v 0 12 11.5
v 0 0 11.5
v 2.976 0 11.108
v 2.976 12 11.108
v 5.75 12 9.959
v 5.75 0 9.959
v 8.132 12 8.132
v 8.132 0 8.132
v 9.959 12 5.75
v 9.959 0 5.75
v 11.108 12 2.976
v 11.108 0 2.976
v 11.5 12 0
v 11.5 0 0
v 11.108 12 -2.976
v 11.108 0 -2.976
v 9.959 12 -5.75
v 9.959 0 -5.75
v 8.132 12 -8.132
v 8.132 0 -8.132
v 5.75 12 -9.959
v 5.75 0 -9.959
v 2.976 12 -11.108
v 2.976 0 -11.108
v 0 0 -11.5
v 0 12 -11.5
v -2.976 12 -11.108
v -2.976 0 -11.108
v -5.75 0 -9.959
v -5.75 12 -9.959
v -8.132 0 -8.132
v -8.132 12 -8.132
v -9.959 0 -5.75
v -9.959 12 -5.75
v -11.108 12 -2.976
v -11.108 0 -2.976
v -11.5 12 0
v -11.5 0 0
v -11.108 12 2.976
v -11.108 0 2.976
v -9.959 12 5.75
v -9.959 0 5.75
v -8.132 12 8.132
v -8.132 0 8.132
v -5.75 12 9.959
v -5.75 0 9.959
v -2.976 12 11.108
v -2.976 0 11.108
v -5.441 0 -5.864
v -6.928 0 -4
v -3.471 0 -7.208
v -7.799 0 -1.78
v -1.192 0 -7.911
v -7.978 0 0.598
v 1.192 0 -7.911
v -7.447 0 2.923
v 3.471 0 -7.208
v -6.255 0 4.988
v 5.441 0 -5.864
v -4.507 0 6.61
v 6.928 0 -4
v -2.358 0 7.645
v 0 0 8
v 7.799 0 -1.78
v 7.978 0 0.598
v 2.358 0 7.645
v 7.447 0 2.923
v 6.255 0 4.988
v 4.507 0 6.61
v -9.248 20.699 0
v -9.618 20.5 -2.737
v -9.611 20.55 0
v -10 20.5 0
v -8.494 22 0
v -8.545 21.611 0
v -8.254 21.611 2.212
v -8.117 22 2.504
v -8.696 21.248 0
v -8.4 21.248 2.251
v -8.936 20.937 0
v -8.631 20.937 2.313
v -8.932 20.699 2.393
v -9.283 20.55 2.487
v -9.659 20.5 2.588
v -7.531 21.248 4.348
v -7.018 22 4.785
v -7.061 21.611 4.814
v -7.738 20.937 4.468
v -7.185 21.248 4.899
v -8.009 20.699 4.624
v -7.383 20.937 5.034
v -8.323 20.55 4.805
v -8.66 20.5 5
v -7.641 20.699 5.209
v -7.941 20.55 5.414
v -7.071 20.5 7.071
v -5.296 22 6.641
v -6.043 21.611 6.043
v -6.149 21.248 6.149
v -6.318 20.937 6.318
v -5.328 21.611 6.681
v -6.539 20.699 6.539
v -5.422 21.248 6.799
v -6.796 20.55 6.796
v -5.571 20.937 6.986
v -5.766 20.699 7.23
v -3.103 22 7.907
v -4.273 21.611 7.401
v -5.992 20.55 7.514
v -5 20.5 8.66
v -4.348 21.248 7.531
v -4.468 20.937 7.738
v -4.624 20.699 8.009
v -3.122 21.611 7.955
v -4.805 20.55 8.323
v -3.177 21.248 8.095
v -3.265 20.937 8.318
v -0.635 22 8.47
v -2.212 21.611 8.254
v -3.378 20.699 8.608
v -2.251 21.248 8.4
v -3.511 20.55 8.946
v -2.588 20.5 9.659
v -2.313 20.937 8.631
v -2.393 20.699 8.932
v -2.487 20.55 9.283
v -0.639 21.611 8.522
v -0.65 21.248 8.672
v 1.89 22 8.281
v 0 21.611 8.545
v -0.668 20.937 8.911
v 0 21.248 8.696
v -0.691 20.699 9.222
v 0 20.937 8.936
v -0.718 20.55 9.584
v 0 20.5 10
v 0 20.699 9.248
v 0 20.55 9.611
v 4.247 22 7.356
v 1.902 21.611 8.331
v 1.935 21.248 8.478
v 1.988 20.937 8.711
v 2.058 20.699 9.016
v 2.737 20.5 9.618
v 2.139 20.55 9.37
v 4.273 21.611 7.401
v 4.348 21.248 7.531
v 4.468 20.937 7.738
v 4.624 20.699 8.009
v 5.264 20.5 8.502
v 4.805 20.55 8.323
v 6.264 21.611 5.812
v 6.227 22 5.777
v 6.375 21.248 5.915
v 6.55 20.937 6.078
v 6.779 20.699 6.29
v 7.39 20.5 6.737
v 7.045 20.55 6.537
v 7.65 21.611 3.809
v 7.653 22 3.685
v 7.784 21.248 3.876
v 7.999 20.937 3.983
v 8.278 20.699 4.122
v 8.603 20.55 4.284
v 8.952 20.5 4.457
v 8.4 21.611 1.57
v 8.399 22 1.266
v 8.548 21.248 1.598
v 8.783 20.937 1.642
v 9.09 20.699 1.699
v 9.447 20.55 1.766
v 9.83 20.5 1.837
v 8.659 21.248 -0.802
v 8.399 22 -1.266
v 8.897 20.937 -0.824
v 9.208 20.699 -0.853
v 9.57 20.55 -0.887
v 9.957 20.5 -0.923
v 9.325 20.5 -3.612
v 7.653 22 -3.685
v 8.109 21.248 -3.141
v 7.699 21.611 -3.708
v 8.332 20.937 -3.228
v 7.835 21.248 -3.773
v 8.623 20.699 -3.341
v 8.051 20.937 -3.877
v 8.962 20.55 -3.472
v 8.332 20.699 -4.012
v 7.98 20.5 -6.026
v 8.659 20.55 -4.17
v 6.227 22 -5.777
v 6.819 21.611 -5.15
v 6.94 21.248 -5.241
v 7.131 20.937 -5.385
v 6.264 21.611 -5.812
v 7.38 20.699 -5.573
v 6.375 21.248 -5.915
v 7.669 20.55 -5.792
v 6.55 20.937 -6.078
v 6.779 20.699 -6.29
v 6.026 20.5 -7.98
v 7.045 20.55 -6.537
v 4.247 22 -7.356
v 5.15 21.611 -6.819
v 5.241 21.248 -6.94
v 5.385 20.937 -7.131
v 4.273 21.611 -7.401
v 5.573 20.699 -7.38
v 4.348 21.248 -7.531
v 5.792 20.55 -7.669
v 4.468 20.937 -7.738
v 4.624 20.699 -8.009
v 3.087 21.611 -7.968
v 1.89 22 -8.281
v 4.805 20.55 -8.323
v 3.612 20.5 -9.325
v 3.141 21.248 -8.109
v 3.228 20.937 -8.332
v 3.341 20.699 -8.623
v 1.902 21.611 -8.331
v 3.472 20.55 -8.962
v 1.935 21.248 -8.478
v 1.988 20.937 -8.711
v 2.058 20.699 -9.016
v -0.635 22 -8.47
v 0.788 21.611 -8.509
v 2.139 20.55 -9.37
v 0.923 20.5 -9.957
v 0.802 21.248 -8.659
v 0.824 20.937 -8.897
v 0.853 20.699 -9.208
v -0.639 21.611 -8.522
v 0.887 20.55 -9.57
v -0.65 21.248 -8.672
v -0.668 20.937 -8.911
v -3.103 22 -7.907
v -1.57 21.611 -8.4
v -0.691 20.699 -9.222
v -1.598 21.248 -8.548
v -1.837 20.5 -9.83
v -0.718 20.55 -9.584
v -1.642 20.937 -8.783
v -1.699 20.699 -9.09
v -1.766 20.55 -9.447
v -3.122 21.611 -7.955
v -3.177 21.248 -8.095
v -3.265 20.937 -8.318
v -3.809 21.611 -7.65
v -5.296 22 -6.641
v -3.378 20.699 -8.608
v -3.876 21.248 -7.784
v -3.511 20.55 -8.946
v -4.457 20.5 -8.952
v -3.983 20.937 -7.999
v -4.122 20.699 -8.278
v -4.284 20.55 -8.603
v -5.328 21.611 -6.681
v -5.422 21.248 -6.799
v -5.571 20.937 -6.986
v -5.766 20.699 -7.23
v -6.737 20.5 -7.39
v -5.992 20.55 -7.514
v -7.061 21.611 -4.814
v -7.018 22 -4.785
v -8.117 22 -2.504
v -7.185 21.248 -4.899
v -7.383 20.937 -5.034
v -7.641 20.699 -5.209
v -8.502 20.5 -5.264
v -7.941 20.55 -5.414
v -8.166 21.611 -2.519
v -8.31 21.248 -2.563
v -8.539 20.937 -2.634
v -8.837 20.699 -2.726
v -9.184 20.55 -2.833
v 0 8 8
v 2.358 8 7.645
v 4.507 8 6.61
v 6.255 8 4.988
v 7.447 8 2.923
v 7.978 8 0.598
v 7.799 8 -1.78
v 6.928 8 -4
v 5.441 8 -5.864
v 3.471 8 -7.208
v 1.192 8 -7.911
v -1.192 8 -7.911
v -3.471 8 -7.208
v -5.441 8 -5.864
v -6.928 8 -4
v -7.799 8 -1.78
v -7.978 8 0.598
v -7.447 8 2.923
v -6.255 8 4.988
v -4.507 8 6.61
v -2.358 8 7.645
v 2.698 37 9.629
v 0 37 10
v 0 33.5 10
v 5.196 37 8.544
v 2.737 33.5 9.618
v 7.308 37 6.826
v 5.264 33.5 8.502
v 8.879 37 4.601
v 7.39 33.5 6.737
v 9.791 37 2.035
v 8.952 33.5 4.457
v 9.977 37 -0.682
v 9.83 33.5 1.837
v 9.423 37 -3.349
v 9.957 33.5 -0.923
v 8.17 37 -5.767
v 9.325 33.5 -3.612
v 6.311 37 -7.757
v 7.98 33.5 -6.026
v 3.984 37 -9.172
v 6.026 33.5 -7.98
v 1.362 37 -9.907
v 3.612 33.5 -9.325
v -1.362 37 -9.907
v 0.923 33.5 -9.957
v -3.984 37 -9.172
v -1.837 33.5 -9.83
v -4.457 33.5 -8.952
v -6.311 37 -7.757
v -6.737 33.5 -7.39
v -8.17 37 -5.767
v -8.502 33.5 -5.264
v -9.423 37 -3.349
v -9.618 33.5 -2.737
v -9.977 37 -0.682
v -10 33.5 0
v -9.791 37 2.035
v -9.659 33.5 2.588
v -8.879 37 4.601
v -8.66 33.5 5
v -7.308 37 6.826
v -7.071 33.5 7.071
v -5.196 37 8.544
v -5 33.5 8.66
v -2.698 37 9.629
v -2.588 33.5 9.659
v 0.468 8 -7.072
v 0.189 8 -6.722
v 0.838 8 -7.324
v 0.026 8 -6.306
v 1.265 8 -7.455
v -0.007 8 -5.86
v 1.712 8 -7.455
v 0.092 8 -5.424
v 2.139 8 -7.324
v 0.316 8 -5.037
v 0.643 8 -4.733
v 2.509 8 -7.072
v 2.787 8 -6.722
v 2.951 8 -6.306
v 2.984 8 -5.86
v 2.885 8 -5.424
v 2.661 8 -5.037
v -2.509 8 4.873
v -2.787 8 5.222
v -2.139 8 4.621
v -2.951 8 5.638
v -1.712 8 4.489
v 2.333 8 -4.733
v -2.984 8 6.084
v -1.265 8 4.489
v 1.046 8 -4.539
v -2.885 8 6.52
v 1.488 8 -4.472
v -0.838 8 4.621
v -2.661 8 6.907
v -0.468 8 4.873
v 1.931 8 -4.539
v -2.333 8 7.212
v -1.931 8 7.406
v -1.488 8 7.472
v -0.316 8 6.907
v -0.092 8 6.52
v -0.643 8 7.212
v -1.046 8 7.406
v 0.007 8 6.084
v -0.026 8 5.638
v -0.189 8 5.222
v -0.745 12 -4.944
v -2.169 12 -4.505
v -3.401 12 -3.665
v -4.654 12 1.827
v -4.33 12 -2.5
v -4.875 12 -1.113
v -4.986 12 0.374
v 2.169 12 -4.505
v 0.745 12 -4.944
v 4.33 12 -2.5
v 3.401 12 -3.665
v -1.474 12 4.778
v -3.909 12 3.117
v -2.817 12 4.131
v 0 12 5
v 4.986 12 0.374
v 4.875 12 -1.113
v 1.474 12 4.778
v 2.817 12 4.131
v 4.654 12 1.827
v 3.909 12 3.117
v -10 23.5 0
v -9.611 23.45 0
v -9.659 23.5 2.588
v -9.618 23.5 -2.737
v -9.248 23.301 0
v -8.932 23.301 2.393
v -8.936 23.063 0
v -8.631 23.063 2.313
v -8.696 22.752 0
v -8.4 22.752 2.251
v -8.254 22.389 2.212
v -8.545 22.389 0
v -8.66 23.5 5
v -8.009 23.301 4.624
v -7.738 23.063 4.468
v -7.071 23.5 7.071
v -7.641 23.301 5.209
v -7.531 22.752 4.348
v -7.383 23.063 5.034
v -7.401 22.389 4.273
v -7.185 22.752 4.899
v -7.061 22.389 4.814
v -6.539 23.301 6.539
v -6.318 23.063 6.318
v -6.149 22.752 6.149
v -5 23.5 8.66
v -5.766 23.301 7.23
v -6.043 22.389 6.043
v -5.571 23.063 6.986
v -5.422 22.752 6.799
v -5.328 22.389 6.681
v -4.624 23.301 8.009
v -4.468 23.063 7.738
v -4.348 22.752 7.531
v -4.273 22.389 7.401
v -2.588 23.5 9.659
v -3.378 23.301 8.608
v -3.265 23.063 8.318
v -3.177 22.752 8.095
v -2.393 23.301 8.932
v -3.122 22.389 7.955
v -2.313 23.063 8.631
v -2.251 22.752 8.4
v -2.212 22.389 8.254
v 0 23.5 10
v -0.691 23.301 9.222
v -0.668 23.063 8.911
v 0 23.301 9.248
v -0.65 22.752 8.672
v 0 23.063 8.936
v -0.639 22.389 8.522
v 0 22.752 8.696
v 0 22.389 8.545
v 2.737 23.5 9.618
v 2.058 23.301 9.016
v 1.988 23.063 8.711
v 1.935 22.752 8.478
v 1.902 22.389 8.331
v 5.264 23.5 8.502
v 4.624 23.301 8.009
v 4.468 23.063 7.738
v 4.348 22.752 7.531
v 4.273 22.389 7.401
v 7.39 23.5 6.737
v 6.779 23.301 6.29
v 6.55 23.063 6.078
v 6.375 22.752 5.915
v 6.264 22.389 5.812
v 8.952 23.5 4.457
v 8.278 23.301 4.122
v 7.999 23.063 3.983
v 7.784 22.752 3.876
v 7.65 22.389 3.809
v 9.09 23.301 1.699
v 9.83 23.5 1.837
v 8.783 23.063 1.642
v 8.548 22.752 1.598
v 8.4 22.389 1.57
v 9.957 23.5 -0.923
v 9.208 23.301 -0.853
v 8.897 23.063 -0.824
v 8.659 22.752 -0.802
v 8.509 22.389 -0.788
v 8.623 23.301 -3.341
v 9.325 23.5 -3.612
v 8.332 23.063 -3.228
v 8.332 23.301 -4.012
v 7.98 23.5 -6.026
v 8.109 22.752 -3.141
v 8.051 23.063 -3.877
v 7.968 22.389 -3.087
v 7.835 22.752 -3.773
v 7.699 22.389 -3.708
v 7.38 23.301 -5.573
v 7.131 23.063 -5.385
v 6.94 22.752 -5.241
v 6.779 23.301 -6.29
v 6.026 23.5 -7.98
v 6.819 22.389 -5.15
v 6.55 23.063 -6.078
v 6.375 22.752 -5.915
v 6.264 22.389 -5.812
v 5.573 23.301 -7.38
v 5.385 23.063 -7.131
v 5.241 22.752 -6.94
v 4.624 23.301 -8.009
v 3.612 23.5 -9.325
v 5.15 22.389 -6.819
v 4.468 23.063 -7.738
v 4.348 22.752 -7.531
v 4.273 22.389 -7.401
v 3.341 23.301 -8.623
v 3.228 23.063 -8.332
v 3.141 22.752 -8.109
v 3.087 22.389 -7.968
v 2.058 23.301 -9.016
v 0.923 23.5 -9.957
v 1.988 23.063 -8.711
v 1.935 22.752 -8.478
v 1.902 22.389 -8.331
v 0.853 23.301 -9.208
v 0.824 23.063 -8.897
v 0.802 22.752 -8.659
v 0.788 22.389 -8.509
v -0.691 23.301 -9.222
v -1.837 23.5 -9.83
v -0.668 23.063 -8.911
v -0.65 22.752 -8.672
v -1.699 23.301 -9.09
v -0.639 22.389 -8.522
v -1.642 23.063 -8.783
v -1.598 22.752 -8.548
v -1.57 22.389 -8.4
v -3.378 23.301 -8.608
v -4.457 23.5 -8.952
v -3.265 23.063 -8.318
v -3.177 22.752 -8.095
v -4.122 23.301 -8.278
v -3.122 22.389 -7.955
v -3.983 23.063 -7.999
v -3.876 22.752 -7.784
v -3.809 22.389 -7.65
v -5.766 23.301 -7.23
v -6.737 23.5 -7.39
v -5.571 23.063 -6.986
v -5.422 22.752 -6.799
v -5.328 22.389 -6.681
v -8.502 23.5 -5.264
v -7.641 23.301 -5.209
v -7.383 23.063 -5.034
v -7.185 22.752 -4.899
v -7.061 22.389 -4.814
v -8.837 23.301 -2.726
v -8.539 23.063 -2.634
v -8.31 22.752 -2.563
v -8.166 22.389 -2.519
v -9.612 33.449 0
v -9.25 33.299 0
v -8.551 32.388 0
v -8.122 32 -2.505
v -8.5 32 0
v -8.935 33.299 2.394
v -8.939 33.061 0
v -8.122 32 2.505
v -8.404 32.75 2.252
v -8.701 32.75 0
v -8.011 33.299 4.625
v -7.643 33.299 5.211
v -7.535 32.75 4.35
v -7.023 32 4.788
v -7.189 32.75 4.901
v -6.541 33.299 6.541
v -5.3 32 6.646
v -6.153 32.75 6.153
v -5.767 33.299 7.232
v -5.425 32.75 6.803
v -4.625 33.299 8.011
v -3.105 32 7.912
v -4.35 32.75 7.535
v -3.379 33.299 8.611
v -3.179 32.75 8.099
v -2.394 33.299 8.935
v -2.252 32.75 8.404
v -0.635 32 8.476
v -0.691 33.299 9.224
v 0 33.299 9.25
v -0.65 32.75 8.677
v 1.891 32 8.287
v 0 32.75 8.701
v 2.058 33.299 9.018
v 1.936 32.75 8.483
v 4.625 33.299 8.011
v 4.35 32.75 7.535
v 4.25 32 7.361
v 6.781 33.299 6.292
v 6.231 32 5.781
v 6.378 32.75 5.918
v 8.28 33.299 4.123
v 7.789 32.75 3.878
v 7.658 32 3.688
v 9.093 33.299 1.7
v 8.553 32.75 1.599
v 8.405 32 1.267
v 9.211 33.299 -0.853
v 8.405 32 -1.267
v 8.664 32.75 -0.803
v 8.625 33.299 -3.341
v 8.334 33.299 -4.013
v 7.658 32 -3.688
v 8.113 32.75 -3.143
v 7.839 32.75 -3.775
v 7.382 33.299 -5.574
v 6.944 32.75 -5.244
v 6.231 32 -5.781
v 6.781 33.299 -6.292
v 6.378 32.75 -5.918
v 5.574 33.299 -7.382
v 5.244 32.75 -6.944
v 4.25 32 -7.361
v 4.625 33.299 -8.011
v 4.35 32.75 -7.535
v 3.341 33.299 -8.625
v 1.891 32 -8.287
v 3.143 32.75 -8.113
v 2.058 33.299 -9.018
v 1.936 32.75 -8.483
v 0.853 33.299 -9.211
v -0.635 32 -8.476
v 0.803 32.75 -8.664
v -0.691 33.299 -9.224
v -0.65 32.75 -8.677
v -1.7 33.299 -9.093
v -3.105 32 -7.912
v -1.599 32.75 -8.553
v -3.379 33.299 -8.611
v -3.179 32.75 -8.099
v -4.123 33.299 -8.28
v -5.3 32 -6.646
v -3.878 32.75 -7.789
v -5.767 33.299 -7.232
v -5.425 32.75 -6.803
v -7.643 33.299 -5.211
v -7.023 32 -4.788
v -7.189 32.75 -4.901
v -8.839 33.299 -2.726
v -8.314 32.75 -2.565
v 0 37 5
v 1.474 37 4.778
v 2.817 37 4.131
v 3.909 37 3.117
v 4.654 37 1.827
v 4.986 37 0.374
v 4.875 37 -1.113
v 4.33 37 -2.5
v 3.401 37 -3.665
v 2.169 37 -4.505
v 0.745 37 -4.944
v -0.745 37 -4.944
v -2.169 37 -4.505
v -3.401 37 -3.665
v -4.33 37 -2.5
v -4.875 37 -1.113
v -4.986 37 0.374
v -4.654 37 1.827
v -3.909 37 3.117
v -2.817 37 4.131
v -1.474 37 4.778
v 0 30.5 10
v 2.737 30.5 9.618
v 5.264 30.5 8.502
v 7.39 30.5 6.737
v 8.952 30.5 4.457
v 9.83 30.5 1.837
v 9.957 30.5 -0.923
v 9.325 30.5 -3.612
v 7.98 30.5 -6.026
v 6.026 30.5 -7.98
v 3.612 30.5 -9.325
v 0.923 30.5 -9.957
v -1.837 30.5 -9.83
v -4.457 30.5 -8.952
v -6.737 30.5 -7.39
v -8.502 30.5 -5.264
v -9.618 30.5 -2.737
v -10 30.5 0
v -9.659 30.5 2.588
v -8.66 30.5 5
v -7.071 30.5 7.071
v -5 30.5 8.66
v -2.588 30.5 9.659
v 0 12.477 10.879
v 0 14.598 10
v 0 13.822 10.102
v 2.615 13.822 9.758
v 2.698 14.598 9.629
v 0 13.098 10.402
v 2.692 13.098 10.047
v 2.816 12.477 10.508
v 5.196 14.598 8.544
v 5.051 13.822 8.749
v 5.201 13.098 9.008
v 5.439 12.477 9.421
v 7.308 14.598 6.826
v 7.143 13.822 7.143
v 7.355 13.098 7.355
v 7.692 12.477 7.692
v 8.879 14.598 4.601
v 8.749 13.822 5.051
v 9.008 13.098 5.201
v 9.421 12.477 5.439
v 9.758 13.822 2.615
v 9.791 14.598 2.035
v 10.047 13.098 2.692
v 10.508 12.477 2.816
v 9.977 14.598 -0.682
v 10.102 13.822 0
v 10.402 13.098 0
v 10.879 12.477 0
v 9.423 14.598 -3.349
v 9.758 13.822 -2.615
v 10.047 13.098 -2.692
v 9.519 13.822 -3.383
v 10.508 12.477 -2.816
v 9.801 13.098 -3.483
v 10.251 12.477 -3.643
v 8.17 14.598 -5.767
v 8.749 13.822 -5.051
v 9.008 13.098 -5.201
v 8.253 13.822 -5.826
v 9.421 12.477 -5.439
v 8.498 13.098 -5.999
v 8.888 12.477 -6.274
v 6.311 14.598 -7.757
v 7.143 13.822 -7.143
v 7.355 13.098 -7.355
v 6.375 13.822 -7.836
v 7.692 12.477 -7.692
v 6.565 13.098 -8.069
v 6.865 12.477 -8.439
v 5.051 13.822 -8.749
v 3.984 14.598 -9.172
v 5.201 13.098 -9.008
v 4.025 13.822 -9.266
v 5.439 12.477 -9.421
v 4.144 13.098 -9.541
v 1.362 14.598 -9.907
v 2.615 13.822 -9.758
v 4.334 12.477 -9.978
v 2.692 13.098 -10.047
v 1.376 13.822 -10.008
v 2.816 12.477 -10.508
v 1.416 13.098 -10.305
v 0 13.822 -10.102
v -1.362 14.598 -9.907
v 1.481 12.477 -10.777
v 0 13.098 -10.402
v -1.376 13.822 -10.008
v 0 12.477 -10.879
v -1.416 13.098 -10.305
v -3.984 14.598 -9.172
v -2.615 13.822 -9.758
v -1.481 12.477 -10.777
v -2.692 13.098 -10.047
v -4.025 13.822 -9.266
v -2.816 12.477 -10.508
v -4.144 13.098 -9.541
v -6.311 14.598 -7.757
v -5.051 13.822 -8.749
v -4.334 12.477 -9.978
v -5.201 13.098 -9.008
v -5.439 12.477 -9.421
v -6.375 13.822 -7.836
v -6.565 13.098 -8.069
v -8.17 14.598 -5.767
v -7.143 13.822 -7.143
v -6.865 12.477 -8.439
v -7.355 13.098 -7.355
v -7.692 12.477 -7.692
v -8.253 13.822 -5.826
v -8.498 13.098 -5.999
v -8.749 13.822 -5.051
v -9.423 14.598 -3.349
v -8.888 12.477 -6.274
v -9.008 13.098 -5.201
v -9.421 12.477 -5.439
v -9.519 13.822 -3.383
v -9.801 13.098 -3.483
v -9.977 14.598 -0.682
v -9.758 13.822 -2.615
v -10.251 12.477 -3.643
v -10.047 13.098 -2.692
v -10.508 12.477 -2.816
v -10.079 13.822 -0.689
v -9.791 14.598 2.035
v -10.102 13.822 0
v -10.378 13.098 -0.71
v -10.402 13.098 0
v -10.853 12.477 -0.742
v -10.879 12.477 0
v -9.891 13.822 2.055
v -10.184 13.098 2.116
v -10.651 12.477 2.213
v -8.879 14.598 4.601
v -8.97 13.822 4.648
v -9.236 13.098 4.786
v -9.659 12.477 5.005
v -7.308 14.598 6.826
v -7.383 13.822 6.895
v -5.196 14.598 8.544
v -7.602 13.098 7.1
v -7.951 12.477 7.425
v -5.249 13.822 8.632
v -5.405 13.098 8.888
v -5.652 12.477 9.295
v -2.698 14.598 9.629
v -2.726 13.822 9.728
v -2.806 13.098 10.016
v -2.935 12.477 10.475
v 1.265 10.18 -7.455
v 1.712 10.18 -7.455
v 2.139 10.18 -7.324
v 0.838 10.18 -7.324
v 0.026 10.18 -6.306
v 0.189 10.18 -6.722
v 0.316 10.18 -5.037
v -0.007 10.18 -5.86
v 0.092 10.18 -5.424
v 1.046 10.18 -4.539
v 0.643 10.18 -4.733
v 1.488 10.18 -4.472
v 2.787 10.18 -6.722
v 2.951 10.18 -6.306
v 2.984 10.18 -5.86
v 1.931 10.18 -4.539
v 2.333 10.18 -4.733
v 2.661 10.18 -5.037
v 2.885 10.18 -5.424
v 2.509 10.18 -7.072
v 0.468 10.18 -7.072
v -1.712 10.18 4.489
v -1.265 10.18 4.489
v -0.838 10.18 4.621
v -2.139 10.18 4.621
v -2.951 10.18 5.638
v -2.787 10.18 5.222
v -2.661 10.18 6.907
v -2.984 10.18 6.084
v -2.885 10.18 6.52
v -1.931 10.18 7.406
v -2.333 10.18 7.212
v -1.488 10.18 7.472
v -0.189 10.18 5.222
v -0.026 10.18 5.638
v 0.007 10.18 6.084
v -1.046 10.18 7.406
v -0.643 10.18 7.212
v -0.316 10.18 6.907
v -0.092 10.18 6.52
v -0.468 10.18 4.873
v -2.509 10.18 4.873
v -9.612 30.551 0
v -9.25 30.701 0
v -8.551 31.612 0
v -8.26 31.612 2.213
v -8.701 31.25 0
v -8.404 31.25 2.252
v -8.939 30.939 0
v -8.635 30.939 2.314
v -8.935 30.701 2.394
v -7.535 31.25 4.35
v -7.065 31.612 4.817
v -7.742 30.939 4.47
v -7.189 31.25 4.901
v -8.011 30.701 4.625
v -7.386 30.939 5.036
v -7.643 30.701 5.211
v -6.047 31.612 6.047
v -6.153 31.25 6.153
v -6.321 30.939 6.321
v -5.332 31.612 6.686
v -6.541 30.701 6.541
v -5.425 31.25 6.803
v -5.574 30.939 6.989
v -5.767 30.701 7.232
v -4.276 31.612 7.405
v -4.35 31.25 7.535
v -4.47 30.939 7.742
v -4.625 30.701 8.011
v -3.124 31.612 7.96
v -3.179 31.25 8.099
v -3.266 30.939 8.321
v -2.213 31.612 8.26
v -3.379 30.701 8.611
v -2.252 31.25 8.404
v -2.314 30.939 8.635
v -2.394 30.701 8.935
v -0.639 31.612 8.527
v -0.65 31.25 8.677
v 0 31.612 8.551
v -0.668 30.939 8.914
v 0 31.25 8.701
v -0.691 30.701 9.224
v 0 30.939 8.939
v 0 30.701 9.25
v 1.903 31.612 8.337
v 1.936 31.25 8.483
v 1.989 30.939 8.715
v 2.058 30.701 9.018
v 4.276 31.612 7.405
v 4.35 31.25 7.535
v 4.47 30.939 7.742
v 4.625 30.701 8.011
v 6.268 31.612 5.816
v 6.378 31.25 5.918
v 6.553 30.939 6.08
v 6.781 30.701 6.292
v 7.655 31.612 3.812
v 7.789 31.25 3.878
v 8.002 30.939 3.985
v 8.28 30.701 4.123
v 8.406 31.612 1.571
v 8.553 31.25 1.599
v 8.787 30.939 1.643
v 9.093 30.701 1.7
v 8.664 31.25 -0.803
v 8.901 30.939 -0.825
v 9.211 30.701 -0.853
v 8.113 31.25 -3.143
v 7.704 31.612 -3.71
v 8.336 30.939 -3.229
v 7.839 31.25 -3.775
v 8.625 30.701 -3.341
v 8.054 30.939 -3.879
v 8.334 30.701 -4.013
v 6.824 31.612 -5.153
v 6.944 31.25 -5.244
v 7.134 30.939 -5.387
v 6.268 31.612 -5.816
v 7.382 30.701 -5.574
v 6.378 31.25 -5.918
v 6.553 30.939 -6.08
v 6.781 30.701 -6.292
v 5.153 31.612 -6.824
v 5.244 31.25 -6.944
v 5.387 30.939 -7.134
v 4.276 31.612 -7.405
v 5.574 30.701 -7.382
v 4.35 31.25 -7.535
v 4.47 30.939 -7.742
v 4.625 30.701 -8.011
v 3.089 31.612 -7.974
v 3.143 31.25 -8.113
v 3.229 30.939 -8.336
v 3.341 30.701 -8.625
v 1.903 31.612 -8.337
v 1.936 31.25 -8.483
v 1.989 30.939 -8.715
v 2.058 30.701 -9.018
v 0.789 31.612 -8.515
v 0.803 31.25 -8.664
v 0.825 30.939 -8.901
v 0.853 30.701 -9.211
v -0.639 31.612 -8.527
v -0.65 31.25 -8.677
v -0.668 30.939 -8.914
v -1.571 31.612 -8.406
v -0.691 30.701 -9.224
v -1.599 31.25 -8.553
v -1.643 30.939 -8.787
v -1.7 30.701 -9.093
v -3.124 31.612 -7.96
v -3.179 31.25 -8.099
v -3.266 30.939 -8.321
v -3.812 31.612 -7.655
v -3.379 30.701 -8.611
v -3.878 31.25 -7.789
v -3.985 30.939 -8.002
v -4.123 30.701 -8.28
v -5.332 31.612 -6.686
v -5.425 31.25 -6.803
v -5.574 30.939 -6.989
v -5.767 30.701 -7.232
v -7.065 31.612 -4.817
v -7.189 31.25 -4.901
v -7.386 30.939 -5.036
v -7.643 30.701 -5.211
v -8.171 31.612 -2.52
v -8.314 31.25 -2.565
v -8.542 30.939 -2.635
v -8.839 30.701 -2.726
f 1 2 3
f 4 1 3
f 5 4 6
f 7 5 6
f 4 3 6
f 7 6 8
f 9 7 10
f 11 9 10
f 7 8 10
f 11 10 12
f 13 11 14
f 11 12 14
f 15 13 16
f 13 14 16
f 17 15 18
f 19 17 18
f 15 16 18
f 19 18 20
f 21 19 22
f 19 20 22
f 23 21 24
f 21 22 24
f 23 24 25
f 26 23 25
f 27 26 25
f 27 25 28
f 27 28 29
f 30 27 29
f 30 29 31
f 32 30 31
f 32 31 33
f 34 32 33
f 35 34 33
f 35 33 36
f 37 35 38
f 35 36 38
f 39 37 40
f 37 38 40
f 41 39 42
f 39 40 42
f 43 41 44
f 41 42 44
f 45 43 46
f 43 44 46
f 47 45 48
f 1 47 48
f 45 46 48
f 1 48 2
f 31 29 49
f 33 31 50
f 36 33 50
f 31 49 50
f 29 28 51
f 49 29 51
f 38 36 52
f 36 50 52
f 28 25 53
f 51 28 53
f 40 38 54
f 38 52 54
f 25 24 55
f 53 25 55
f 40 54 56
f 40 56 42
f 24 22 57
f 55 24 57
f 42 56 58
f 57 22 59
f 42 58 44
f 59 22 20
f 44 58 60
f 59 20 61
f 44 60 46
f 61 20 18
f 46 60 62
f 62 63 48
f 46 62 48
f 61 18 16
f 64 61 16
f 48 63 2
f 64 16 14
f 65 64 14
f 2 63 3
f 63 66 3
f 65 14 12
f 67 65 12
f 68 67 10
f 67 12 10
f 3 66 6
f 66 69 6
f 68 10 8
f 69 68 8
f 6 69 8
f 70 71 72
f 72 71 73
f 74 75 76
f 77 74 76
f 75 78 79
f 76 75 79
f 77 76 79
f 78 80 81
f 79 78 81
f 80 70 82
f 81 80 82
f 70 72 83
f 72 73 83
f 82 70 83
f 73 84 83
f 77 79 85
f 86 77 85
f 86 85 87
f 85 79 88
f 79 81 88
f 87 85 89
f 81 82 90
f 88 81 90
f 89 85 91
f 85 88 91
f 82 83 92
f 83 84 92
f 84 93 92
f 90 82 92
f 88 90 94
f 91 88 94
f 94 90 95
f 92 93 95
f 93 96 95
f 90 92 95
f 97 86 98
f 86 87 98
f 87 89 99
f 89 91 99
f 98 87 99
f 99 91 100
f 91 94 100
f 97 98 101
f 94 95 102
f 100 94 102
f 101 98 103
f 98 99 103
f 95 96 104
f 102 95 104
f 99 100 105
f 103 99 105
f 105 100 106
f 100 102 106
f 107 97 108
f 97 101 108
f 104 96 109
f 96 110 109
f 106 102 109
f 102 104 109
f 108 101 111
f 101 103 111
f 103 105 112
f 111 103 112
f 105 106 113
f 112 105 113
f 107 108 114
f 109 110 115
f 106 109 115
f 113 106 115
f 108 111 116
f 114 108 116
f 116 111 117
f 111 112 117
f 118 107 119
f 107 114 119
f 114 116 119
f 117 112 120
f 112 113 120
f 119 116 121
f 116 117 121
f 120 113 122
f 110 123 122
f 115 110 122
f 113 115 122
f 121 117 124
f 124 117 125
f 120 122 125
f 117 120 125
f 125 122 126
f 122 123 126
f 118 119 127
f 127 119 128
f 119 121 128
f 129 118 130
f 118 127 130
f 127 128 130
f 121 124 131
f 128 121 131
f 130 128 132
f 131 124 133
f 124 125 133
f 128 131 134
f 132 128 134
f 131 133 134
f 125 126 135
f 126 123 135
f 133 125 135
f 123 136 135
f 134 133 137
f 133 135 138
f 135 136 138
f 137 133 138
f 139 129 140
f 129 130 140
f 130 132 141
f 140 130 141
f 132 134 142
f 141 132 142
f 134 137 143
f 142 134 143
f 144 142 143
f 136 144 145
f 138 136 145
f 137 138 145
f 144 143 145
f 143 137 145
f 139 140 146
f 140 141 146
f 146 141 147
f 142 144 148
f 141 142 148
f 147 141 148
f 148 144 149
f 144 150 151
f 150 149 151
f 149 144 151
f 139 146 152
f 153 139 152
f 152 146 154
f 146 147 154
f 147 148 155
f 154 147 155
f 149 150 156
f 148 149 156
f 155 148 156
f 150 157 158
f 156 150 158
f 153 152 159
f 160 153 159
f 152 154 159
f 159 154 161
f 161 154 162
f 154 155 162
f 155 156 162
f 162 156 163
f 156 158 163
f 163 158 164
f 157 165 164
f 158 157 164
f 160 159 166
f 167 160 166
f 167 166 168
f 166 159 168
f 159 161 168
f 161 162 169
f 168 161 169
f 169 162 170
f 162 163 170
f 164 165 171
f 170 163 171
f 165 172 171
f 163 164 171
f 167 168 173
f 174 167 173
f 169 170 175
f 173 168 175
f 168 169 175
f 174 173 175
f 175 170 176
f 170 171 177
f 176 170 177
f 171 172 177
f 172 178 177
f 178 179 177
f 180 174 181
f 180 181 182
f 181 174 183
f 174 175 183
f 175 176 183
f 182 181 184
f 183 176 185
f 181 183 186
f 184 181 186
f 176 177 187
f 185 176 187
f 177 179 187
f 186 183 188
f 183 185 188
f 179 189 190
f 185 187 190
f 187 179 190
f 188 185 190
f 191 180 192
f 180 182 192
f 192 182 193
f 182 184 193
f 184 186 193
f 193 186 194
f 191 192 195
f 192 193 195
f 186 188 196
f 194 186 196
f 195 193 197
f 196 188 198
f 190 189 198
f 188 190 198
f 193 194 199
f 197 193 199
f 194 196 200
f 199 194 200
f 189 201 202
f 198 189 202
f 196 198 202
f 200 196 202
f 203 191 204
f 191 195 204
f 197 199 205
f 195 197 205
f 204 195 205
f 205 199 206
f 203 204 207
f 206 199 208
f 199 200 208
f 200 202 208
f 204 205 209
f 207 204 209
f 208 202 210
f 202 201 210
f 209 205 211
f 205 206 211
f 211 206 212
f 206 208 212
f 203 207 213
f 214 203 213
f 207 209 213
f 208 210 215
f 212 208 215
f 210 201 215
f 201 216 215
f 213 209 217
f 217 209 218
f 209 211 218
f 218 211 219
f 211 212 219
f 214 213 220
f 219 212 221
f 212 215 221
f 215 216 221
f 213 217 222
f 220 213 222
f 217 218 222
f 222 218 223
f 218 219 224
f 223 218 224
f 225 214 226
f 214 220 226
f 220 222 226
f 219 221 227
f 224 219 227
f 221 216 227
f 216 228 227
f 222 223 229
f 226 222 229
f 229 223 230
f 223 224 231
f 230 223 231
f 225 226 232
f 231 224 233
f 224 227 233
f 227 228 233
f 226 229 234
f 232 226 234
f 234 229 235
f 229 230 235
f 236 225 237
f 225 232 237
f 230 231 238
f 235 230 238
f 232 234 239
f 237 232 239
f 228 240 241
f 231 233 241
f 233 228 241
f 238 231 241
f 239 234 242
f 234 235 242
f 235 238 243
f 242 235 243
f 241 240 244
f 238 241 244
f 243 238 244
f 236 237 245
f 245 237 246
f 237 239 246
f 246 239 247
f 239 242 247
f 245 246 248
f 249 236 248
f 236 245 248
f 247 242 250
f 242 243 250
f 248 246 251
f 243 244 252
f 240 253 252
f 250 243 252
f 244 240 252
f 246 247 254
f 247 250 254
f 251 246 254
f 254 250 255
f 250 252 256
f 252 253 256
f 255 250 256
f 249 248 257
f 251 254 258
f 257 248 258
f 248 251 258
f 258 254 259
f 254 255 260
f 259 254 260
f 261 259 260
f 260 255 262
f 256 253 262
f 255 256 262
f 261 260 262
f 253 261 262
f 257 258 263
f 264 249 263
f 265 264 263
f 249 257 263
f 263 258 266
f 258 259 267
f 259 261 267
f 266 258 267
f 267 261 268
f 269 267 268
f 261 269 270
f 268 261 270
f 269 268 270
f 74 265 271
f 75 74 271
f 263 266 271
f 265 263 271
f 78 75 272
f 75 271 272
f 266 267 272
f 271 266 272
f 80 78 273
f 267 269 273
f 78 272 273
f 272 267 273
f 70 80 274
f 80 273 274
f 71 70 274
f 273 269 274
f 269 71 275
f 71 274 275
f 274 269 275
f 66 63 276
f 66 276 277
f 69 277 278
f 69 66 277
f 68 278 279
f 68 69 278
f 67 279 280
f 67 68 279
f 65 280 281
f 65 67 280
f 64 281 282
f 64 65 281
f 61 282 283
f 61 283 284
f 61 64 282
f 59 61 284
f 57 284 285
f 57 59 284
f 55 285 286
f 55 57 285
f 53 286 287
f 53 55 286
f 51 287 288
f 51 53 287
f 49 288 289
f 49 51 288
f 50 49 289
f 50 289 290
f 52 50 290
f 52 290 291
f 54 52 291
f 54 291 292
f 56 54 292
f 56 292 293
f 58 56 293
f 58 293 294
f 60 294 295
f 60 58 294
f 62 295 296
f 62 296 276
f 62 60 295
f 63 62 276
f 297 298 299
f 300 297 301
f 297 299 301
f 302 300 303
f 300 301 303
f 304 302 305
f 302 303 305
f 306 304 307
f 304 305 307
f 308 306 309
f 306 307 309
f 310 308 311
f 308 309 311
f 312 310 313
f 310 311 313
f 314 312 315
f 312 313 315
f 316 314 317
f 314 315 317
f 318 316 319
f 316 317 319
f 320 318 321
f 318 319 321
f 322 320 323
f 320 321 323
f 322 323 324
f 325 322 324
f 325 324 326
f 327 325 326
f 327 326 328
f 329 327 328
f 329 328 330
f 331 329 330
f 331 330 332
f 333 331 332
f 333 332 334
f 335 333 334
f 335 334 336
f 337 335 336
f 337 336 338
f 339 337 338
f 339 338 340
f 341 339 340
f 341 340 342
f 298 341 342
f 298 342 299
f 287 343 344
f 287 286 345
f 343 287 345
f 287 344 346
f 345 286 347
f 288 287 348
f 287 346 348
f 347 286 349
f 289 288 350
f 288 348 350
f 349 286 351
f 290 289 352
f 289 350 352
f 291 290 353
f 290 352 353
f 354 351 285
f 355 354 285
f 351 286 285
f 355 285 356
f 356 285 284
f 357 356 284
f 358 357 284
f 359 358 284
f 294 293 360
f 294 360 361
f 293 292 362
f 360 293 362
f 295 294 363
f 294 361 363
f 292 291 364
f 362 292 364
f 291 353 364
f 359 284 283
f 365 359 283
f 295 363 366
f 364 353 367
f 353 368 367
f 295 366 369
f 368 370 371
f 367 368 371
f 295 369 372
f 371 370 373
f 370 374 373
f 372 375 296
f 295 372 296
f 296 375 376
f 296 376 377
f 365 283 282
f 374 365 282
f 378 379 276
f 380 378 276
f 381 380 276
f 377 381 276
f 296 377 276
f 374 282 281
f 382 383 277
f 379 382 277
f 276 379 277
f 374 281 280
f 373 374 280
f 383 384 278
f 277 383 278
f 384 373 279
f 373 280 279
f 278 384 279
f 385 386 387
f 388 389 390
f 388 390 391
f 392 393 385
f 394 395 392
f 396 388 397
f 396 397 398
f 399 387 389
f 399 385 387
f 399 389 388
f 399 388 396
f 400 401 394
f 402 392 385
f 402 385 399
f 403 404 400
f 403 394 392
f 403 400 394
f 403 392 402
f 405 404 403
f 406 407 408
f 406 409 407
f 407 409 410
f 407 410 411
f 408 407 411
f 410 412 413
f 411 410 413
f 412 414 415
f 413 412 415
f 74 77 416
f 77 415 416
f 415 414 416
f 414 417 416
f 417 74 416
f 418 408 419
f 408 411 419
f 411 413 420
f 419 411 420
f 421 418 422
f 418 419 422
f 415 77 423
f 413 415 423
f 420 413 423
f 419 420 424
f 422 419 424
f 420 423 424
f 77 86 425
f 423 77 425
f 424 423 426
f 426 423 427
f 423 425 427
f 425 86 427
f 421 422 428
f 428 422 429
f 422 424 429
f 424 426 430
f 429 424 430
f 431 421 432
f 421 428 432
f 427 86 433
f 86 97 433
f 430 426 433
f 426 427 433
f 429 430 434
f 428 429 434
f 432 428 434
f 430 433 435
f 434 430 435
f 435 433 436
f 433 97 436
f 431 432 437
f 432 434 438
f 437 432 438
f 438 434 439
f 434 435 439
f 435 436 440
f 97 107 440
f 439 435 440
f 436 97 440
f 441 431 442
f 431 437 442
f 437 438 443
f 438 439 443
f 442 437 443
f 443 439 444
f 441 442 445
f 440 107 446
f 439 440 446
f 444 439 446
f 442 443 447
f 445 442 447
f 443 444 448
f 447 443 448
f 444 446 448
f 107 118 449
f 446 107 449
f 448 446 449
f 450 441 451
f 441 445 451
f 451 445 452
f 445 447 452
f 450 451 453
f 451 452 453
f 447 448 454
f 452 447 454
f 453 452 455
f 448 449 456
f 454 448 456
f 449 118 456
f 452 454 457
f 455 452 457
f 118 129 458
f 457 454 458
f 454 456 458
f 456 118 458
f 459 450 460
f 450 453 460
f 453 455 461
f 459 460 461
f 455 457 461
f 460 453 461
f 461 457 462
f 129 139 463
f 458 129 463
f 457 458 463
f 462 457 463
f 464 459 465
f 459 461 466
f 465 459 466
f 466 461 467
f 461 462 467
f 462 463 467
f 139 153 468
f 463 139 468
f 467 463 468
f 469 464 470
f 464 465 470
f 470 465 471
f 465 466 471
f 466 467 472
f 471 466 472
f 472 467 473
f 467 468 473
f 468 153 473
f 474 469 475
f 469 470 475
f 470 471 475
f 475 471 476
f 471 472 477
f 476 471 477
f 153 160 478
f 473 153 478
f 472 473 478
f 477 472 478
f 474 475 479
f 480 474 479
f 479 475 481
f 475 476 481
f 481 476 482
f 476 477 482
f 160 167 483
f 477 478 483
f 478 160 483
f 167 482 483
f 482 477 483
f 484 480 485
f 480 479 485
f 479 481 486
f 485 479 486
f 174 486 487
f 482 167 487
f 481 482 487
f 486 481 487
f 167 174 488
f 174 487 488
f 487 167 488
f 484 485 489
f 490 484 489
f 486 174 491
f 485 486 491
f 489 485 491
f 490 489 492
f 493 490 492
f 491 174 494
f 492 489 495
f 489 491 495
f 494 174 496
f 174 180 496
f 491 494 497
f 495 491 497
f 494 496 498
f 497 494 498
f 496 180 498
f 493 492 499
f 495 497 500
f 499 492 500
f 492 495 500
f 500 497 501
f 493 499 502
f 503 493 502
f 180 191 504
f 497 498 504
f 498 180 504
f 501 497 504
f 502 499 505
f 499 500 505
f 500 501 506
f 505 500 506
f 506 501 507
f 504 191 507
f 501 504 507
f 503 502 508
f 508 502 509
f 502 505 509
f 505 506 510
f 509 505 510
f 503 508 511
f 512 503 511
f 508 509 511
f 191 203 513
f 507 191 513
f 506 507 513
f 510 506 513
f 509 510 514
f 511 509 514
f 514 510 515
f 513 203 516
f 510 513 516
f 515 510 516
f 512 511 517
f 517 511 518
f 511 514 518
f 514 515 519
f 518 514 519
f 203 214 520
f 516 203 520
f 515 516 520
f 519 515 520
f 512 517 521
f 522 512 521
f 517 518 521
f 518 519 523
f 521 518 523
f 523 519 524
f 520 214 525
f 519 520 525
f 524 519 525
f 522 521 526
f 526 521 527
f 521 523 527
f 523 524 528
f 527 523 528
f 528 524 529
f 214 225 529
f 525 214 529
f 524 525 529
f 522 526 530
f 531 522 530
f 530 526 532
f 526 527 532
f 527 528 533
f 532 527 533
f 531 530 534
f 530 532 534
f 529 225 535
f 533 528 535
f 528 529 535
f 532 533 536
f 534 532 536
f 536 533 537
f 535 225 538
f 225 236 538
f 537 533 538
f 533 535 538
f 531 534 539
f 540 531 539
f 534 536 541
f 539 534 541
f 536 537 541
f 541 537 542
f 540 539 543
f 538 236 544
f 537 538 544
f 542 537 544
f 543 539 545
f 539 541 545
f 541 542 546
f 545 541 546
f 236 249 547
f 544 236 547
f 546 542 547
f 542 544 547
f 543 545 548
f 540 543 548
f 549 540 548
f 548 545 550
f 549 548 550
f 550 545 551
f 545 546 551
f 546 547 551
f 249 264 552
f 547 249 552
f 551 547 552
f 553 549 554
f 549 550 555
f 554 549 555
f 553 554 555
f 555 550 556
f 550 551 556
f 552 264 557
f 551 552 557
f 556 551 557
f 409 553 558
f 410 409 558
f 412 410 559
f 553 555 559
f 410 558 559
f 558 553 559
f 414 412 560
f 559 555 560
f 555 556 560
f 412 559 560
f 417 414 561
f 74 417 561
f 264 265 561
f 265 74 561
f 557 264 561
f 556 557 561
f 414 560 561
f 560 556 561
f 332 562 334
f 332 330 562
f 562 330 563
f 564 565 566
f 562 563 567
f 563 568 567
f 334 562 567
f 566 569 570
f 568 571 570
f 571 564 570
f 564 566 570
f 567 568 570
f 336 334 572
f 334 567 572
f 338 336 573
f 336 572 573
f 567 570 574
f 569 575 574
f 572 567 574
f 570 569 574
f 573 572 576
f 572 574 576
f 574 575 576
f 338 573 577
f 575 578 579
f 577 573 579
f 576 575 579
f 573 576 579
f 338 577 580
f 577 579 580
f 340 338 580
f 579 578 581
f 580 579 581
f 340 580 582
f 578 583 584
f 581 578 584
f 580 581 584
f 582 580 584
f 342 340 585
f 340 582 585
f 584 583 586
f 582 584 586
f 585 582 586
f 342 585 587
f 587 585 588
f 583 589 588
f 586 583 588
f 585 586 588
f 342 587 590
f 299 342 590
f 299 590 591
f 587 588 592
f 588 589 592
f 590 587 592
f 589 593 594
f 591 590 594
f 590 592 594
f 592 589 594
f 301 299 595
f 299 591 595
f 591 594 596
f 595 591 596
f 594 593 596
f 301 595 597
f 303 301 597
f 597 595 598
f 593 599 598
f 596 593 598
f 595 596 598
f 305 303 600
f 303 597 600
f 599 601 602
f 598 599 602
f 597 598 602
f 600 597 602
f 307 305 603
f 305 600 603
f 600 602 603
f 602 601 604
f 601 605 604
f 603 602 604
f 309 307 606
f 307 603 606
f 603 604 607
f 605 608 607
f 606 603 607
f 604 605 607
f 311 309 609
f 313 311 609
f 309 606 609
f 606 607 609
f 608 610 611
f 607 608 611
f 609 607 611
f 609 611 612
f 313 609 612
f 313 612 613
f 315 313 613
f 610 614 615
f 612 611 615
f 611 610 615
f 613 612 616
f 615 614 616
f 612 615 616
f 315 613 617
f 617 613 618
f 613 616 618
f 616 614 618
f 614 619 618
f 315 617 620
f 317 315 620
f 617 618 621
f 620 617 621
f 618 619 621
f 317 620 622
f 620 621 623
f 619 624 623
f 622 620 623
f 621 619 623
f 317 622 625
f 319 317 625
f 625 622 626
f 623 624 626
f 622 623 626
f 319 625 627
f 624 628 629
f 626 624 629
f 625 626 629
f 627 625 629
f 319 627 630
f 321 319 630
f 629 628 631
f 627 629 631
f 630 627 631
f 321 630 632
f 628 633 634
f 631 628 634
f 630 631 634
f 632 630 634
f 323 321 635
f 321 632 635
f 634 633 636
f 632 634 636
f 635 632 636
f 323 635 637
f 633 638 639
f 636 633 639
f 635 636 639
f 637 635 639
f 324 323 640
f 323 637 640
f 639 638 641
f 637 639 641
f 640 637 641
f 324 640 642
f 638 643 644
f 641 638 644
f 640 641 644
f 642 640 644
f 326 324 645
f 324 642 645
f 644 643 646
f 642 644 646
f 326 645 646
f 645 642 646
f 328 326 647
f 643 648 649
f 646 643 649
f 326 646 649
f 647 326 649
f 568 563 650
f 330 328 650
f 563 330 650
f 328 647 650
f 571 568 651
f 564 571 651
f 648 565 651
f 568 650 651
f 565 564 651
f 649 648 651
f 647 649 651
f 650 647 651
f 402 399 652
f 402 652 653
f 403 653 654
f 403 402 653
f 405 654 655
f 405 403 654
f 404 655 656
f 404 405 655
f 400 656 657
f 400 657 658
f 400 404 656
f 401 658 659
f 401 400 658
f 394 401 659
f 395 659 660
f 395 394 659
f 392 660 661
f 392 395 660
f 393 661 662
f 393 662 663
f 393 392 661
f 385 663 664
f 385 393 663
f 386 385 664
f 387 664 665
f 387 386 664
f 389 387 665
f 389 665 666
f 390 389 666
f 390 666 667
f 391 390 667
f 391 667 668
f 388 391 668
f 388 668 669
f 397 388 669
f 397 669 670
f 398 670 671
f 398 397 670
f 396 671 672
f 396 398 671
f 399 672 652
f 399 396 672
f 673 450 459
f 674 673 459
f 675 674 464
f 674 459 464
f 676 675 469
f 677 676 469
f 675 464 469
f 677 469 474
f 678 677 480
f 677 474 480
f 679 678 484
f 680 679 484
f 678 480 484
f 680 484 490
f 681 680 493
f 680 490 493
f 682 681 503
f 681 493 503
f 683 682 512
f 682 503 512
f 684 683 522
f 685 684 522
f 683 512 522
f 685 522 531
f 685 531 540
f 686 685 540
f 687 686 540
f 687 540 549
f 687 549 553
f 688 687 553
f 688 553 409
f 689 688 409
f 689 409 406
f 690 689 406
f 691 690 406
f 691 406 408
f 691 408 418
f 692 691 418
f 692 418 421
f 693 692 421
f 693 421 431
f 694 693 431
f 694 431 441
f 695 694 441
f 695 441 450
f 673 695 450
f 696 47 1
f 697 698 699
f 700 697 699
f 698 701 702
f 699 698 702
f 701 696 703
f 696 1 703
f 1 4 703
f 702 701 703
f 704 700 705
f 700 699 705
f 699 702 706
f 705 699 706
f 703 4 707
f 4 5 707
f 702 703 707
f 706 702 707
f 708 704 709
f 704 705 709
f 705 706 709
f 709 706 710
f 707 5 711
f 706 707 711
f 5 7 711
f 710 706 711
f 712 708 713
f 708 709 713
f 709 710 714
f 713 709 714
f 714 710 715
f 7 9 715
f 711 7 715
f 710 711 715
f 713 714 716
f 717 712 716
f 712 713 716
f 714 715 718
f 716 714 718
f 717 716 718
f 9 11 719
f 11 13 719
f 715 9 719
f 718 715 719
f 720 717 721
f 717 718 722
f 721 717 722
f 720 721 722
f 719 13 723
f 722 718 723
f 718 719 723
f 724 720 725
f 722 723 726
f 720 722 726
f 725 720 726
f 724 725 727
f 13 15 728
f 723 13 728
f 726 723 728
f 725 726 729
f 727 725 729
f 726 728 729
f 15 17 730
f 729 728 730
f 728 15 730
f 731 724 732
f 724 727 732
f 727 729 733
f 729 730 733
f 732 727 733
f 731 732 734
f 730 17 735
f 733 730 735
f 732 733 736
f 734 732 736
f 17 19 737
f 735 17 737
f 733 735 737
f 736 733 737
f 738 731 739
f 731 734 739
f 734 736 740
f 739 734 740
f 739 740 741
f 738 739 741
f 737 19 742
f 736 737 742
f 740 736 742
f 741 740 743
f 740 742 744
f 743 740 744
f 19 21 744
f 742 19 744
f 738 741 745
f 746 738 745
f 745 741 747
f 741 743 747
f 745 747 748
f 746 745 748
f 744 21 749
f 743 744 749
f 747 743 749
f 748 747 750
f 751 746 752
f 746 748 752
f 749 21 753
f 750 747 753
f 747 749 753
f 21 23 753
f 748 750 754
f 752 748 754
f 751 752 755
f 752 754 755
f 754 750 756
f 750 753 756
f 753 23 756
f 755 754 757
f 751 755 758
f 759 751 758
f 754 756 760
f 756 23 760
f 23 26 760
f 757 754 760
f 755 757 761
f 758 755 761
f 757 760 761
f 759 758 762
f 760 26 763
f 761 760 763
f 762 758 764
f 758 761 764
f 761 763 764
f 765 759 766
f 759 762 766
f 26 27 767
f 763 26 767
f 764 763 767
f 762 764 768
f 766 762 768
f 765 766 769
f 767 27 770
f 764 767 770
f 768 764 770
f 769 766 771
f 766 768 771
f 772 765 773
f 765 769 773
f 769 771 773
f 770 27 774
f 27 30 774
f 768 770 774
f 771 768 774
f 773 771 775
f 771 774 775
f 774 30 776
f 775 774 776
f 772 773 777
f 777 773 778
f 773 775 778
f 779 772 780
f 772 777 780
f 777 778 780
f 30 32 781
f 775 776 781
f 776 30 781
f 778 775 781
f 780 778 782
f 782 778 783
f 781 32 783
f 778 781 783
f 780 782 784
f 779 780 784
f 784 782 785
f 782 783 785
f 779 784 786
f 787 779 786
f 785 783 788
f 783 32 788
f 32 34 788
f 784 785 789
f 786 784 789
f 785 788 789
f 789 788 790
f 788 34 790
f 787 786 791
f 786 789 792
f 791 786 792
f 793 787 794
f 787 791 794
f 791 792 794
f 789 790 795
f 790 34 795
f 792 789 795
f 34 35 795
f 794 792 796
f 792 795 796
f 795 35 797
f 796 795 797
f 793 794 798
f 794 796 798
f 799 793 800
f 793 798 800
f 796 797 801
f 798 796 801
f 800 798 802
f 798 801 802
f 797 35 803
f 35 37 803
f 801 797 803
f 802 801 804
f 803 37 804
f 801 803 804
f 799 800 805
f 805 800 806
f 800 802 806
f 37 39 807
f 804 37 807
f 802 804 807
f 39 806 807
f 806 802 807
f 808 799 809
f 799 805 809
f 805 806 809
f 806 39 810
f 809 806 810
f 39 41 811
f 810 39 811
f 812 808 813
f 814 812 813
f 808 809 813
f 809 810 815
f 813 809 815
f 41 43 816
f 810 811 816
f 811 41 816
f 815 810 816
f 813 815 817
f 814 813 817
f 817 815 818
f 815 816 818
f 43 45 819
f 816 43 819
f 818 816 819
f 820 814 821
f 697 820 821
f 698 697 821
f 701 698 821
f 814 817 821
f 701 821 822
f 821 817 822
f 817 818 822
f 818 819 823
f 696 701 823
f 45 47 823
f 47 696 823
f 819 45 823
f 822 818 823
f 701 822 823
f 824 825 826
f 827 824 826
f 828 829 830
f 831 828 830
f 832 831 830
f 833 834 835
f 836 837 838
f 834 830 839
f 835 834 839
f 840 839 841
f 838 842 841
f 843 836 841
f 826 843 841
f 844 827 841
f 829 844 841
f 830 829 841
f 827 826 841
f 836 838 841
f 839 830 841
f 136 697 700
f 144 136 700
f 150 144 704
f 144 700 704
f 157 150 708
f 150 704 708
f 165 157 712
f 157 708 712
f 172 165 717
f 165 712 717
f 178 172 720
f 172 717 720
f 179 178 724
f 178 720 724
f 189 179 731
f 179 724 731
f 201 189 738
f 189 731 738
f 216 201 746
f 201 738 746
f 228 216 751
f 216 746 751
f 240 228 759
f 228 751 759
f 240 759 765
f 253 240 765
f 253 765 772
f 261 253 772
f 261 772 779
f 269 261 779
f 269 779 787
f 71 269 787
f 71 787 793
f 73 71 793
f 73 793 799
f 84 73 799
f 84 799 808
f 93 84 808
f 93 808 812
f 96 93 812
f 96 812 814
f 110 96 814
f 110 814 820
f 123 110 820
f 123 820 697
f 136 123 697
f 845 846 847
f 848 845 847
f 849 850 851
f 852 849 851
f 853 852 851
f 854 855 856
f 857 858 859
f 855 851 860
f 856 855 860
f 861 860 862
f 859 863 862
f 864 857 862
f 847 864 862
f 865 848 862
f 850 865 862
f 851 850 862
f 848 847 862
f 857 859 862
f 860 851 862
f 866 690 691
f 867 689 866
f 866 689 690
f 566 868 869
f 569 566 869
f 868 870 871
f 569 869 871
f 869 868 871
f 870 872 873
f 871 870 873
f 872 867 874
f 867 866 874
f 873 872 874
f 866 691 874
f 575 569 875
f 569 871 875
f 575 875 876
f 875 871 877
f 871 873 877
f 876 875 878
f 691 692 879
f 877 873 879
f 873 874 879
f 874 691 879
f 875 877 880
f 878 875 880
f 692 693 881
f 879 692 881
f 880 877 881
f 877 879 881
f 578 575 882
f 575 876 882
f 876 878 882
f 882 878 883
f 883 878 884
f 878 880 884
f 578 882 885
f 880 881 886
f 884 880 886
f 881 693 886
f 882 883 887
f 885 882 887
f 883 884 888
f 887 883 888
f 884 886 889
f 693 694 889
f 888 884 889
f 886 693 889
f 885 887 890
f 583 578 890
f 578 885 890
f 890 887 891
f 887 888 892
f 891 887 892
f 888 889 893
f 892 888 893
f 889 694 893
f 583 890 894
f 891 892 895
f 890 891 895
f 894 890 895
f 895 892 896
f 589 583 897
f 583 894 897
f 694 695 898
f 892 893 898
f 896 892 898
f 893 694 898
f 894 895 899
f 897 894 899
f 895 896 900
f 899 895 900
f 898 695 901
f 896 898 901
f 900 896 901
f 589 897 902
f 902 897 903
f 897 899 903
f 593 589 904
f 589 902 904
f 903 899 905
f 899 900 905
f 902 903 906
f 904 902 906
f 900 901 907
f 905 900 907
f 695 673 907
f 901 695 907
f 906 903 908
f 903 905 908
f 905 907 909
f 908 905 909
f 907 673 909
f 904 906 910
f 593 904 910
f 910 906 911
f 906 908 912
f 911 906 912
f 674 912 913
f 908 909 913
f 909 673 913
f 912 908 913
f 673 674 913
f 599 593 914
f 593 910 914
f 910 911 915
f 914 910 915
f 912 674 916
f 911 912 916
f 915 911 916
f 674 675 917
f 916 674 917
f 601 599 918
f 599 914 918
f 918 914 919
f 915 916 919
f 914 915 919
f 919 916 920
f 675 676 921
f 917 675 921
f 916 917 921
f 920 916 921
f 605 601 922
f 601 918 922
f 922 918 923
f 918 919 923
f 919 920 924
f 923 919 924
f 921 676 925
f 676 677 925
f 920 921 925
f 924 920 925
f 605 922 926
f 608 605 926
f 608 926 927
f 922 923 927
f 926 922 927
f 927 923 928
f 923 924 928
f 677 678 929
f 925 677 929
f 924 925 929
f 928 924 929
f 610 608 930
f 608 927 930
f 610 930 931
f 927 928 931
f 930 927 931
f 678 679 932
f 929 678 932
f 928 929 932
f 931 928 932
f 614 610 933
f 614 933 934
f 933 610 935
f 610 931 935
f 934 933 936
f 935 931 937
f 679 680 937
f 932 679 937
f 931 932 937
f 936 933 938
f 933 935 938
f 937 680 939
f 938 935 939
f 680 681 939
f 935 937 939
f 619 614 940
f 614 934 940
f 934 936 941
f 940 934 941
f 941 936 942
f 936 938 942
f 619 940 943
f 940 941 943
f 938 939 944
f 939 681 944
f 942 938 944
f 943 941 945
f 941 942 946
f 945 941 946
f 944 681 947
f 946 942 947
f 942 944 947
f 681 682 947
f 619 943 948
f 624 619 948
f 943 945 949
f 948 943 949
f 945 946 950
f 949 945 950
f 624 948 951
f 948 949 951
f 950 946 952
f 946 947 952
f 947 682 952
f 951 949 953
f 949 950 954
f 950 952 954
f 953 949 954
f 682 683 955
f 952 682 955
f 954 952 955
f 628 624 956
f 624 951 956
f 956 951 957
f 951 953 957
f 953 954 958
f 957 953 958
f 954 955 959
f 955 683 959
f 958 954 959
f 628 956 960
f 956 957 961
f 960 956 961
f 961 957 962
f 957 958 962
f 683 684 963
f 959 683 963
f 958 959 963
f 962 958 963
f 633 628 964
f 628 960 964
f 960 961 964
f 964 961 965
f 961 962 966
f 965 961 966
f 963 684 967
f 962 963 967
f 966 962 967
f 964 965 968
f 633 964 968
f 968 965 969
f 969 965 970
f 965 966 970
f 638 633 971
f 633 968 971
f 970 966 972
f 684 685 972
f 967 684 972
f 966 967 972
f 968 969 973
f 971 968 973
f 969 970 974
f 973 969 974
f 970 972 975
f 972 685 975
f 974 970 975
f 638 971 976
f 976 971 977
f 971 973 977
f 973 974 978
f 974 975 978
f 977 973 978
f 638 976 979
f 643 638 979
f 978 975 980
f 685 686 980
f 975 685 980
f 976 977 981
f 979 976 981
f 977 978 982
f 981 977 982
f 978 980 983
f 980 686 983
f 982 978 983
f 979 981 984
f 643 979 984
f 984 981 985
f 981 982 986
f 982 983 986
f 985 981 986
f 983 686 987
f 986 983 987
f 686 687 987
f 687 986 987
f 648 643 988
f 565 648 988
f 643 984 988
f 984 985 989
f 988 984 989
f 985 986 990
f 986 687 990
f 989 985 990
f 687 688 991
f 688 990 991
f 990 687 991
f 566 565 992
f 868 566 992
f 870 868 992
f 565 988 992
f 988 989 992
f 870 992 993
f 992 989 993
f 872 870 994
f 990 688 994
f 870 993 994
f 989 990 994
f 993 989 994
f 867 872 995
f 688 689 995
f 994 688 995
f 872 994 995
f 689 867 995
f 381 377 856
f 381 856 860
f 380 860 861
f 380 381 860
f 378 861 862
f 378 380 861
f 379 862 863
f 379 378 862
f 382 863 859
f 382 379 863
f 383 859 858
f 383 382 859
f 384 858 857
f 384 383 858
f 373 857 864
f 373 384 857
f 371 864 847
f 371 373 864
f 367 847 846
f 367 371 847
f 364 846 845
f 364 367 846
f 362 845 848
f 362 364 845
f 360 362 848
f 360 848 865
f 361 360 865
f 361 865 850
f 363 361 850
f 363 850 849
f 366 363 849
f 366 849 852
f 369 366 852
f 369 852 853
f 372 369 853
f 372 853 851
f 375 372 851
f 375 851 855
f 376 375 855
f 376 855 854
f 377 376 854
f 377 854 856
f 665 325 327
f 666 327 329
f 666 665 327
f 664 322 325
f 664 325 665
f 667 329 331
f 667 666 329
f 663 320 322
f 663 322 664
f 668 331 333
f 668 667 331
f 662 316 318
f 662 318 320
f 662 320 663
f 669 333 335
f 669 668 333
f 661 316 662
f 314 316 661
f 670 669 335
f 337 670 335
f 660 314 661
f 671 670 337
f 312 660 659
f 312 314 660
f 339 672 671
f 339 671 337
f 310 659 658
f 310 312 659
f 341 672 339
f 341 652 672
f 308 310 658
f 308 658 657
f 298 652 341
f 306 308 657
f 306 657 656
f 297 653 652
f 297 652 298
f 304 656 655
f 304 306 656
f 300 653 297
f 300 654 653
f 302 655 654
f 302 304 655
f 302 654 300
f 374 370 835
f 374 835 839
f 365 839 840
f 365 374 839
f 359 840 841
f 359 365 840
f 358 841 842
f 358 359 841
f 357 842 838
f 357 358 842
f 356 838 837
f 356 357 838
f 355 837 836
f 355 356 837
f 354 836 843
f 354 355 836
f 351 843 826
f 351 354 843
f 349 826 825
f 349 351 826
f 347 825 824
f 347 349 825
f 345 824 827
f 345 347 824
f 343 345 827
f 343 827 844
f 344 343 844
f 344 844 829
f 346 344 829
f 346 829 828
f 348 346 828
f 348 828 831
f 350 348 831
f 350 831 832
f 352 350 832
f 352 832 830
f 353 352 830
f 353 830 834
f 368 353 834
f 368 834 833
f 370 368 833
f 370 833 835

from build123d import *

# Parameters (mm, degrees)
SKETCH_1_R          = 11.5
SKETCH_1_R_2        = 8
EXTRUDE_1_DEPTH     = 8
SKETCH_2_R          = 11.5
EXTRUDE_2_DEPTH     = 4
SKETCH_3_R          = 1.5
CUT_EXTRUDE_1_DEPTH = 2.2
SKETCH_4_R          = 10
SKETCH_4_R_2        = 5
EXTRUDE_3_DEPTH     = 25
FILLET_1_R          = 3
SKETCH_5_R          = 1.5


with BuildPart() as part:
    # Эскиз1 → Вытянуть1 (new body)
    with BuildSketch(Plane(origin=(0, 0, 0), x_dir=(1, 0, 0), z_dir=(0, 1, 0))):
        with Locations(Location((0, 0, 0), (0, 0, 270))):
            Circle(SKETCH_1_R)
        with Locations(Location((0, 0, 0), (0, 0, 270))):
            Circle(SKETCH_1_R_2, mode=Mode.SUBTRACT)
    extrude(amount=EXTRUDE_1_DEPTH)

    # Эскиз2 → Вытянуть2 (add)
    with BuildSketch(Plane(origin=(0, 8, 0), x_dir=(1, 0, 0), z_dir=(0, 1, 0))):
        with Locations(Location((0, 0, 0), (0, 0, 270))):
            Circle(SKETCH_2_R)
    extrude(amount=EXTRUDE_2_DEPTH)

    # Эскиз3 → Вырез-Вытянуть1 (cut)
    with BuildSketch(Plane(origin=(0, 7.979736606, 0), x_dir=(1, 0, 0), z_dir=(0, 1, 0))):
        with Locations(Location((-1.488385607, -5.972232604, 0), (0, 0, 270))):
            Circle(SKETCH_3_R)
        with Locations(Location((1.488385607, 5.972232604, 0), (0, 0, 270))):
            Circle(SKETCH_3_R)
    extrude(amount=CUT_EXTRUDE_1_DEPTH, mode=Mode.SUBTRACT)

    # Эскиз4 → Вытянуть3 (add)
    with BuildSketch(Plane(origin=(0, 12, 0), x_dir=(1, 0, 0), z_dir=(0, 1, 0))):
        with Locations(Location((0, 0, 0), (0, 0, 270))):
            Circle(SKETCH_4_R)
        with Locations(Location((0, 0, 0), (0, 0, 270))):
            Circle(SKETCH_4_R_2, mode=Mode.SUBTRACT)
    extrude(amount=EXTRUDE_3_DEPTH)

    # Скругление1
    # the kernel refuses this fillet: 3 mm, written as the material it adds along each edge
    with BuildSketch(Plane(origin=(0, 12, 0), x_dir=(0, 0, 1), z_dir=(-1, 0, 0))) as fillet_1_piece_1:
        with BuildLine():
            CenterArc((13, 2.598076211), FILLET_1_R, 180, 60)
            Line((10, 2.598076211), (9.94, 2.598076211))
            Line((9.94, 2.598076211), (9.94, 0))
            Line((9.94, 0), (10, -0.06))
            ThreePointArc((10, -0.06), (10.75, -0.06), (11.47, -0.051961524))
            Line((11.47, -0.051961524), (11.5, 0))
        make_face()
    revolve(axis=Axis((0, 12, 0), (0, 1, 0)))

    # Вырез-По траектории2: sweep along a path in Эскиз7
    with BuildLine(Plane(origin=(0, 32, 0), x_dir=(-1, 0, 0), z_dir=(0, 1, 0))) as sweep_2_path:
        CenterArc((0, 0), 10, 0, 360)
    # Эскиз5 → Вырез-По траектории2 (sweep, cut)
    with BuildSketch(Plane(origin=(0, 0, 0), x_dir=(0, 0, -1), z_dir=(1, 0, 0))):
        with Locations((-9.994082338, 22)):
            Circle(SKETCH_5_R)
        with Locations((-10, 32)):
            Circle(SKETCH_5_R)
    sweep(path=sweep_2_path.line, mode=Mode.SUBTRACT)


solid = part.part
